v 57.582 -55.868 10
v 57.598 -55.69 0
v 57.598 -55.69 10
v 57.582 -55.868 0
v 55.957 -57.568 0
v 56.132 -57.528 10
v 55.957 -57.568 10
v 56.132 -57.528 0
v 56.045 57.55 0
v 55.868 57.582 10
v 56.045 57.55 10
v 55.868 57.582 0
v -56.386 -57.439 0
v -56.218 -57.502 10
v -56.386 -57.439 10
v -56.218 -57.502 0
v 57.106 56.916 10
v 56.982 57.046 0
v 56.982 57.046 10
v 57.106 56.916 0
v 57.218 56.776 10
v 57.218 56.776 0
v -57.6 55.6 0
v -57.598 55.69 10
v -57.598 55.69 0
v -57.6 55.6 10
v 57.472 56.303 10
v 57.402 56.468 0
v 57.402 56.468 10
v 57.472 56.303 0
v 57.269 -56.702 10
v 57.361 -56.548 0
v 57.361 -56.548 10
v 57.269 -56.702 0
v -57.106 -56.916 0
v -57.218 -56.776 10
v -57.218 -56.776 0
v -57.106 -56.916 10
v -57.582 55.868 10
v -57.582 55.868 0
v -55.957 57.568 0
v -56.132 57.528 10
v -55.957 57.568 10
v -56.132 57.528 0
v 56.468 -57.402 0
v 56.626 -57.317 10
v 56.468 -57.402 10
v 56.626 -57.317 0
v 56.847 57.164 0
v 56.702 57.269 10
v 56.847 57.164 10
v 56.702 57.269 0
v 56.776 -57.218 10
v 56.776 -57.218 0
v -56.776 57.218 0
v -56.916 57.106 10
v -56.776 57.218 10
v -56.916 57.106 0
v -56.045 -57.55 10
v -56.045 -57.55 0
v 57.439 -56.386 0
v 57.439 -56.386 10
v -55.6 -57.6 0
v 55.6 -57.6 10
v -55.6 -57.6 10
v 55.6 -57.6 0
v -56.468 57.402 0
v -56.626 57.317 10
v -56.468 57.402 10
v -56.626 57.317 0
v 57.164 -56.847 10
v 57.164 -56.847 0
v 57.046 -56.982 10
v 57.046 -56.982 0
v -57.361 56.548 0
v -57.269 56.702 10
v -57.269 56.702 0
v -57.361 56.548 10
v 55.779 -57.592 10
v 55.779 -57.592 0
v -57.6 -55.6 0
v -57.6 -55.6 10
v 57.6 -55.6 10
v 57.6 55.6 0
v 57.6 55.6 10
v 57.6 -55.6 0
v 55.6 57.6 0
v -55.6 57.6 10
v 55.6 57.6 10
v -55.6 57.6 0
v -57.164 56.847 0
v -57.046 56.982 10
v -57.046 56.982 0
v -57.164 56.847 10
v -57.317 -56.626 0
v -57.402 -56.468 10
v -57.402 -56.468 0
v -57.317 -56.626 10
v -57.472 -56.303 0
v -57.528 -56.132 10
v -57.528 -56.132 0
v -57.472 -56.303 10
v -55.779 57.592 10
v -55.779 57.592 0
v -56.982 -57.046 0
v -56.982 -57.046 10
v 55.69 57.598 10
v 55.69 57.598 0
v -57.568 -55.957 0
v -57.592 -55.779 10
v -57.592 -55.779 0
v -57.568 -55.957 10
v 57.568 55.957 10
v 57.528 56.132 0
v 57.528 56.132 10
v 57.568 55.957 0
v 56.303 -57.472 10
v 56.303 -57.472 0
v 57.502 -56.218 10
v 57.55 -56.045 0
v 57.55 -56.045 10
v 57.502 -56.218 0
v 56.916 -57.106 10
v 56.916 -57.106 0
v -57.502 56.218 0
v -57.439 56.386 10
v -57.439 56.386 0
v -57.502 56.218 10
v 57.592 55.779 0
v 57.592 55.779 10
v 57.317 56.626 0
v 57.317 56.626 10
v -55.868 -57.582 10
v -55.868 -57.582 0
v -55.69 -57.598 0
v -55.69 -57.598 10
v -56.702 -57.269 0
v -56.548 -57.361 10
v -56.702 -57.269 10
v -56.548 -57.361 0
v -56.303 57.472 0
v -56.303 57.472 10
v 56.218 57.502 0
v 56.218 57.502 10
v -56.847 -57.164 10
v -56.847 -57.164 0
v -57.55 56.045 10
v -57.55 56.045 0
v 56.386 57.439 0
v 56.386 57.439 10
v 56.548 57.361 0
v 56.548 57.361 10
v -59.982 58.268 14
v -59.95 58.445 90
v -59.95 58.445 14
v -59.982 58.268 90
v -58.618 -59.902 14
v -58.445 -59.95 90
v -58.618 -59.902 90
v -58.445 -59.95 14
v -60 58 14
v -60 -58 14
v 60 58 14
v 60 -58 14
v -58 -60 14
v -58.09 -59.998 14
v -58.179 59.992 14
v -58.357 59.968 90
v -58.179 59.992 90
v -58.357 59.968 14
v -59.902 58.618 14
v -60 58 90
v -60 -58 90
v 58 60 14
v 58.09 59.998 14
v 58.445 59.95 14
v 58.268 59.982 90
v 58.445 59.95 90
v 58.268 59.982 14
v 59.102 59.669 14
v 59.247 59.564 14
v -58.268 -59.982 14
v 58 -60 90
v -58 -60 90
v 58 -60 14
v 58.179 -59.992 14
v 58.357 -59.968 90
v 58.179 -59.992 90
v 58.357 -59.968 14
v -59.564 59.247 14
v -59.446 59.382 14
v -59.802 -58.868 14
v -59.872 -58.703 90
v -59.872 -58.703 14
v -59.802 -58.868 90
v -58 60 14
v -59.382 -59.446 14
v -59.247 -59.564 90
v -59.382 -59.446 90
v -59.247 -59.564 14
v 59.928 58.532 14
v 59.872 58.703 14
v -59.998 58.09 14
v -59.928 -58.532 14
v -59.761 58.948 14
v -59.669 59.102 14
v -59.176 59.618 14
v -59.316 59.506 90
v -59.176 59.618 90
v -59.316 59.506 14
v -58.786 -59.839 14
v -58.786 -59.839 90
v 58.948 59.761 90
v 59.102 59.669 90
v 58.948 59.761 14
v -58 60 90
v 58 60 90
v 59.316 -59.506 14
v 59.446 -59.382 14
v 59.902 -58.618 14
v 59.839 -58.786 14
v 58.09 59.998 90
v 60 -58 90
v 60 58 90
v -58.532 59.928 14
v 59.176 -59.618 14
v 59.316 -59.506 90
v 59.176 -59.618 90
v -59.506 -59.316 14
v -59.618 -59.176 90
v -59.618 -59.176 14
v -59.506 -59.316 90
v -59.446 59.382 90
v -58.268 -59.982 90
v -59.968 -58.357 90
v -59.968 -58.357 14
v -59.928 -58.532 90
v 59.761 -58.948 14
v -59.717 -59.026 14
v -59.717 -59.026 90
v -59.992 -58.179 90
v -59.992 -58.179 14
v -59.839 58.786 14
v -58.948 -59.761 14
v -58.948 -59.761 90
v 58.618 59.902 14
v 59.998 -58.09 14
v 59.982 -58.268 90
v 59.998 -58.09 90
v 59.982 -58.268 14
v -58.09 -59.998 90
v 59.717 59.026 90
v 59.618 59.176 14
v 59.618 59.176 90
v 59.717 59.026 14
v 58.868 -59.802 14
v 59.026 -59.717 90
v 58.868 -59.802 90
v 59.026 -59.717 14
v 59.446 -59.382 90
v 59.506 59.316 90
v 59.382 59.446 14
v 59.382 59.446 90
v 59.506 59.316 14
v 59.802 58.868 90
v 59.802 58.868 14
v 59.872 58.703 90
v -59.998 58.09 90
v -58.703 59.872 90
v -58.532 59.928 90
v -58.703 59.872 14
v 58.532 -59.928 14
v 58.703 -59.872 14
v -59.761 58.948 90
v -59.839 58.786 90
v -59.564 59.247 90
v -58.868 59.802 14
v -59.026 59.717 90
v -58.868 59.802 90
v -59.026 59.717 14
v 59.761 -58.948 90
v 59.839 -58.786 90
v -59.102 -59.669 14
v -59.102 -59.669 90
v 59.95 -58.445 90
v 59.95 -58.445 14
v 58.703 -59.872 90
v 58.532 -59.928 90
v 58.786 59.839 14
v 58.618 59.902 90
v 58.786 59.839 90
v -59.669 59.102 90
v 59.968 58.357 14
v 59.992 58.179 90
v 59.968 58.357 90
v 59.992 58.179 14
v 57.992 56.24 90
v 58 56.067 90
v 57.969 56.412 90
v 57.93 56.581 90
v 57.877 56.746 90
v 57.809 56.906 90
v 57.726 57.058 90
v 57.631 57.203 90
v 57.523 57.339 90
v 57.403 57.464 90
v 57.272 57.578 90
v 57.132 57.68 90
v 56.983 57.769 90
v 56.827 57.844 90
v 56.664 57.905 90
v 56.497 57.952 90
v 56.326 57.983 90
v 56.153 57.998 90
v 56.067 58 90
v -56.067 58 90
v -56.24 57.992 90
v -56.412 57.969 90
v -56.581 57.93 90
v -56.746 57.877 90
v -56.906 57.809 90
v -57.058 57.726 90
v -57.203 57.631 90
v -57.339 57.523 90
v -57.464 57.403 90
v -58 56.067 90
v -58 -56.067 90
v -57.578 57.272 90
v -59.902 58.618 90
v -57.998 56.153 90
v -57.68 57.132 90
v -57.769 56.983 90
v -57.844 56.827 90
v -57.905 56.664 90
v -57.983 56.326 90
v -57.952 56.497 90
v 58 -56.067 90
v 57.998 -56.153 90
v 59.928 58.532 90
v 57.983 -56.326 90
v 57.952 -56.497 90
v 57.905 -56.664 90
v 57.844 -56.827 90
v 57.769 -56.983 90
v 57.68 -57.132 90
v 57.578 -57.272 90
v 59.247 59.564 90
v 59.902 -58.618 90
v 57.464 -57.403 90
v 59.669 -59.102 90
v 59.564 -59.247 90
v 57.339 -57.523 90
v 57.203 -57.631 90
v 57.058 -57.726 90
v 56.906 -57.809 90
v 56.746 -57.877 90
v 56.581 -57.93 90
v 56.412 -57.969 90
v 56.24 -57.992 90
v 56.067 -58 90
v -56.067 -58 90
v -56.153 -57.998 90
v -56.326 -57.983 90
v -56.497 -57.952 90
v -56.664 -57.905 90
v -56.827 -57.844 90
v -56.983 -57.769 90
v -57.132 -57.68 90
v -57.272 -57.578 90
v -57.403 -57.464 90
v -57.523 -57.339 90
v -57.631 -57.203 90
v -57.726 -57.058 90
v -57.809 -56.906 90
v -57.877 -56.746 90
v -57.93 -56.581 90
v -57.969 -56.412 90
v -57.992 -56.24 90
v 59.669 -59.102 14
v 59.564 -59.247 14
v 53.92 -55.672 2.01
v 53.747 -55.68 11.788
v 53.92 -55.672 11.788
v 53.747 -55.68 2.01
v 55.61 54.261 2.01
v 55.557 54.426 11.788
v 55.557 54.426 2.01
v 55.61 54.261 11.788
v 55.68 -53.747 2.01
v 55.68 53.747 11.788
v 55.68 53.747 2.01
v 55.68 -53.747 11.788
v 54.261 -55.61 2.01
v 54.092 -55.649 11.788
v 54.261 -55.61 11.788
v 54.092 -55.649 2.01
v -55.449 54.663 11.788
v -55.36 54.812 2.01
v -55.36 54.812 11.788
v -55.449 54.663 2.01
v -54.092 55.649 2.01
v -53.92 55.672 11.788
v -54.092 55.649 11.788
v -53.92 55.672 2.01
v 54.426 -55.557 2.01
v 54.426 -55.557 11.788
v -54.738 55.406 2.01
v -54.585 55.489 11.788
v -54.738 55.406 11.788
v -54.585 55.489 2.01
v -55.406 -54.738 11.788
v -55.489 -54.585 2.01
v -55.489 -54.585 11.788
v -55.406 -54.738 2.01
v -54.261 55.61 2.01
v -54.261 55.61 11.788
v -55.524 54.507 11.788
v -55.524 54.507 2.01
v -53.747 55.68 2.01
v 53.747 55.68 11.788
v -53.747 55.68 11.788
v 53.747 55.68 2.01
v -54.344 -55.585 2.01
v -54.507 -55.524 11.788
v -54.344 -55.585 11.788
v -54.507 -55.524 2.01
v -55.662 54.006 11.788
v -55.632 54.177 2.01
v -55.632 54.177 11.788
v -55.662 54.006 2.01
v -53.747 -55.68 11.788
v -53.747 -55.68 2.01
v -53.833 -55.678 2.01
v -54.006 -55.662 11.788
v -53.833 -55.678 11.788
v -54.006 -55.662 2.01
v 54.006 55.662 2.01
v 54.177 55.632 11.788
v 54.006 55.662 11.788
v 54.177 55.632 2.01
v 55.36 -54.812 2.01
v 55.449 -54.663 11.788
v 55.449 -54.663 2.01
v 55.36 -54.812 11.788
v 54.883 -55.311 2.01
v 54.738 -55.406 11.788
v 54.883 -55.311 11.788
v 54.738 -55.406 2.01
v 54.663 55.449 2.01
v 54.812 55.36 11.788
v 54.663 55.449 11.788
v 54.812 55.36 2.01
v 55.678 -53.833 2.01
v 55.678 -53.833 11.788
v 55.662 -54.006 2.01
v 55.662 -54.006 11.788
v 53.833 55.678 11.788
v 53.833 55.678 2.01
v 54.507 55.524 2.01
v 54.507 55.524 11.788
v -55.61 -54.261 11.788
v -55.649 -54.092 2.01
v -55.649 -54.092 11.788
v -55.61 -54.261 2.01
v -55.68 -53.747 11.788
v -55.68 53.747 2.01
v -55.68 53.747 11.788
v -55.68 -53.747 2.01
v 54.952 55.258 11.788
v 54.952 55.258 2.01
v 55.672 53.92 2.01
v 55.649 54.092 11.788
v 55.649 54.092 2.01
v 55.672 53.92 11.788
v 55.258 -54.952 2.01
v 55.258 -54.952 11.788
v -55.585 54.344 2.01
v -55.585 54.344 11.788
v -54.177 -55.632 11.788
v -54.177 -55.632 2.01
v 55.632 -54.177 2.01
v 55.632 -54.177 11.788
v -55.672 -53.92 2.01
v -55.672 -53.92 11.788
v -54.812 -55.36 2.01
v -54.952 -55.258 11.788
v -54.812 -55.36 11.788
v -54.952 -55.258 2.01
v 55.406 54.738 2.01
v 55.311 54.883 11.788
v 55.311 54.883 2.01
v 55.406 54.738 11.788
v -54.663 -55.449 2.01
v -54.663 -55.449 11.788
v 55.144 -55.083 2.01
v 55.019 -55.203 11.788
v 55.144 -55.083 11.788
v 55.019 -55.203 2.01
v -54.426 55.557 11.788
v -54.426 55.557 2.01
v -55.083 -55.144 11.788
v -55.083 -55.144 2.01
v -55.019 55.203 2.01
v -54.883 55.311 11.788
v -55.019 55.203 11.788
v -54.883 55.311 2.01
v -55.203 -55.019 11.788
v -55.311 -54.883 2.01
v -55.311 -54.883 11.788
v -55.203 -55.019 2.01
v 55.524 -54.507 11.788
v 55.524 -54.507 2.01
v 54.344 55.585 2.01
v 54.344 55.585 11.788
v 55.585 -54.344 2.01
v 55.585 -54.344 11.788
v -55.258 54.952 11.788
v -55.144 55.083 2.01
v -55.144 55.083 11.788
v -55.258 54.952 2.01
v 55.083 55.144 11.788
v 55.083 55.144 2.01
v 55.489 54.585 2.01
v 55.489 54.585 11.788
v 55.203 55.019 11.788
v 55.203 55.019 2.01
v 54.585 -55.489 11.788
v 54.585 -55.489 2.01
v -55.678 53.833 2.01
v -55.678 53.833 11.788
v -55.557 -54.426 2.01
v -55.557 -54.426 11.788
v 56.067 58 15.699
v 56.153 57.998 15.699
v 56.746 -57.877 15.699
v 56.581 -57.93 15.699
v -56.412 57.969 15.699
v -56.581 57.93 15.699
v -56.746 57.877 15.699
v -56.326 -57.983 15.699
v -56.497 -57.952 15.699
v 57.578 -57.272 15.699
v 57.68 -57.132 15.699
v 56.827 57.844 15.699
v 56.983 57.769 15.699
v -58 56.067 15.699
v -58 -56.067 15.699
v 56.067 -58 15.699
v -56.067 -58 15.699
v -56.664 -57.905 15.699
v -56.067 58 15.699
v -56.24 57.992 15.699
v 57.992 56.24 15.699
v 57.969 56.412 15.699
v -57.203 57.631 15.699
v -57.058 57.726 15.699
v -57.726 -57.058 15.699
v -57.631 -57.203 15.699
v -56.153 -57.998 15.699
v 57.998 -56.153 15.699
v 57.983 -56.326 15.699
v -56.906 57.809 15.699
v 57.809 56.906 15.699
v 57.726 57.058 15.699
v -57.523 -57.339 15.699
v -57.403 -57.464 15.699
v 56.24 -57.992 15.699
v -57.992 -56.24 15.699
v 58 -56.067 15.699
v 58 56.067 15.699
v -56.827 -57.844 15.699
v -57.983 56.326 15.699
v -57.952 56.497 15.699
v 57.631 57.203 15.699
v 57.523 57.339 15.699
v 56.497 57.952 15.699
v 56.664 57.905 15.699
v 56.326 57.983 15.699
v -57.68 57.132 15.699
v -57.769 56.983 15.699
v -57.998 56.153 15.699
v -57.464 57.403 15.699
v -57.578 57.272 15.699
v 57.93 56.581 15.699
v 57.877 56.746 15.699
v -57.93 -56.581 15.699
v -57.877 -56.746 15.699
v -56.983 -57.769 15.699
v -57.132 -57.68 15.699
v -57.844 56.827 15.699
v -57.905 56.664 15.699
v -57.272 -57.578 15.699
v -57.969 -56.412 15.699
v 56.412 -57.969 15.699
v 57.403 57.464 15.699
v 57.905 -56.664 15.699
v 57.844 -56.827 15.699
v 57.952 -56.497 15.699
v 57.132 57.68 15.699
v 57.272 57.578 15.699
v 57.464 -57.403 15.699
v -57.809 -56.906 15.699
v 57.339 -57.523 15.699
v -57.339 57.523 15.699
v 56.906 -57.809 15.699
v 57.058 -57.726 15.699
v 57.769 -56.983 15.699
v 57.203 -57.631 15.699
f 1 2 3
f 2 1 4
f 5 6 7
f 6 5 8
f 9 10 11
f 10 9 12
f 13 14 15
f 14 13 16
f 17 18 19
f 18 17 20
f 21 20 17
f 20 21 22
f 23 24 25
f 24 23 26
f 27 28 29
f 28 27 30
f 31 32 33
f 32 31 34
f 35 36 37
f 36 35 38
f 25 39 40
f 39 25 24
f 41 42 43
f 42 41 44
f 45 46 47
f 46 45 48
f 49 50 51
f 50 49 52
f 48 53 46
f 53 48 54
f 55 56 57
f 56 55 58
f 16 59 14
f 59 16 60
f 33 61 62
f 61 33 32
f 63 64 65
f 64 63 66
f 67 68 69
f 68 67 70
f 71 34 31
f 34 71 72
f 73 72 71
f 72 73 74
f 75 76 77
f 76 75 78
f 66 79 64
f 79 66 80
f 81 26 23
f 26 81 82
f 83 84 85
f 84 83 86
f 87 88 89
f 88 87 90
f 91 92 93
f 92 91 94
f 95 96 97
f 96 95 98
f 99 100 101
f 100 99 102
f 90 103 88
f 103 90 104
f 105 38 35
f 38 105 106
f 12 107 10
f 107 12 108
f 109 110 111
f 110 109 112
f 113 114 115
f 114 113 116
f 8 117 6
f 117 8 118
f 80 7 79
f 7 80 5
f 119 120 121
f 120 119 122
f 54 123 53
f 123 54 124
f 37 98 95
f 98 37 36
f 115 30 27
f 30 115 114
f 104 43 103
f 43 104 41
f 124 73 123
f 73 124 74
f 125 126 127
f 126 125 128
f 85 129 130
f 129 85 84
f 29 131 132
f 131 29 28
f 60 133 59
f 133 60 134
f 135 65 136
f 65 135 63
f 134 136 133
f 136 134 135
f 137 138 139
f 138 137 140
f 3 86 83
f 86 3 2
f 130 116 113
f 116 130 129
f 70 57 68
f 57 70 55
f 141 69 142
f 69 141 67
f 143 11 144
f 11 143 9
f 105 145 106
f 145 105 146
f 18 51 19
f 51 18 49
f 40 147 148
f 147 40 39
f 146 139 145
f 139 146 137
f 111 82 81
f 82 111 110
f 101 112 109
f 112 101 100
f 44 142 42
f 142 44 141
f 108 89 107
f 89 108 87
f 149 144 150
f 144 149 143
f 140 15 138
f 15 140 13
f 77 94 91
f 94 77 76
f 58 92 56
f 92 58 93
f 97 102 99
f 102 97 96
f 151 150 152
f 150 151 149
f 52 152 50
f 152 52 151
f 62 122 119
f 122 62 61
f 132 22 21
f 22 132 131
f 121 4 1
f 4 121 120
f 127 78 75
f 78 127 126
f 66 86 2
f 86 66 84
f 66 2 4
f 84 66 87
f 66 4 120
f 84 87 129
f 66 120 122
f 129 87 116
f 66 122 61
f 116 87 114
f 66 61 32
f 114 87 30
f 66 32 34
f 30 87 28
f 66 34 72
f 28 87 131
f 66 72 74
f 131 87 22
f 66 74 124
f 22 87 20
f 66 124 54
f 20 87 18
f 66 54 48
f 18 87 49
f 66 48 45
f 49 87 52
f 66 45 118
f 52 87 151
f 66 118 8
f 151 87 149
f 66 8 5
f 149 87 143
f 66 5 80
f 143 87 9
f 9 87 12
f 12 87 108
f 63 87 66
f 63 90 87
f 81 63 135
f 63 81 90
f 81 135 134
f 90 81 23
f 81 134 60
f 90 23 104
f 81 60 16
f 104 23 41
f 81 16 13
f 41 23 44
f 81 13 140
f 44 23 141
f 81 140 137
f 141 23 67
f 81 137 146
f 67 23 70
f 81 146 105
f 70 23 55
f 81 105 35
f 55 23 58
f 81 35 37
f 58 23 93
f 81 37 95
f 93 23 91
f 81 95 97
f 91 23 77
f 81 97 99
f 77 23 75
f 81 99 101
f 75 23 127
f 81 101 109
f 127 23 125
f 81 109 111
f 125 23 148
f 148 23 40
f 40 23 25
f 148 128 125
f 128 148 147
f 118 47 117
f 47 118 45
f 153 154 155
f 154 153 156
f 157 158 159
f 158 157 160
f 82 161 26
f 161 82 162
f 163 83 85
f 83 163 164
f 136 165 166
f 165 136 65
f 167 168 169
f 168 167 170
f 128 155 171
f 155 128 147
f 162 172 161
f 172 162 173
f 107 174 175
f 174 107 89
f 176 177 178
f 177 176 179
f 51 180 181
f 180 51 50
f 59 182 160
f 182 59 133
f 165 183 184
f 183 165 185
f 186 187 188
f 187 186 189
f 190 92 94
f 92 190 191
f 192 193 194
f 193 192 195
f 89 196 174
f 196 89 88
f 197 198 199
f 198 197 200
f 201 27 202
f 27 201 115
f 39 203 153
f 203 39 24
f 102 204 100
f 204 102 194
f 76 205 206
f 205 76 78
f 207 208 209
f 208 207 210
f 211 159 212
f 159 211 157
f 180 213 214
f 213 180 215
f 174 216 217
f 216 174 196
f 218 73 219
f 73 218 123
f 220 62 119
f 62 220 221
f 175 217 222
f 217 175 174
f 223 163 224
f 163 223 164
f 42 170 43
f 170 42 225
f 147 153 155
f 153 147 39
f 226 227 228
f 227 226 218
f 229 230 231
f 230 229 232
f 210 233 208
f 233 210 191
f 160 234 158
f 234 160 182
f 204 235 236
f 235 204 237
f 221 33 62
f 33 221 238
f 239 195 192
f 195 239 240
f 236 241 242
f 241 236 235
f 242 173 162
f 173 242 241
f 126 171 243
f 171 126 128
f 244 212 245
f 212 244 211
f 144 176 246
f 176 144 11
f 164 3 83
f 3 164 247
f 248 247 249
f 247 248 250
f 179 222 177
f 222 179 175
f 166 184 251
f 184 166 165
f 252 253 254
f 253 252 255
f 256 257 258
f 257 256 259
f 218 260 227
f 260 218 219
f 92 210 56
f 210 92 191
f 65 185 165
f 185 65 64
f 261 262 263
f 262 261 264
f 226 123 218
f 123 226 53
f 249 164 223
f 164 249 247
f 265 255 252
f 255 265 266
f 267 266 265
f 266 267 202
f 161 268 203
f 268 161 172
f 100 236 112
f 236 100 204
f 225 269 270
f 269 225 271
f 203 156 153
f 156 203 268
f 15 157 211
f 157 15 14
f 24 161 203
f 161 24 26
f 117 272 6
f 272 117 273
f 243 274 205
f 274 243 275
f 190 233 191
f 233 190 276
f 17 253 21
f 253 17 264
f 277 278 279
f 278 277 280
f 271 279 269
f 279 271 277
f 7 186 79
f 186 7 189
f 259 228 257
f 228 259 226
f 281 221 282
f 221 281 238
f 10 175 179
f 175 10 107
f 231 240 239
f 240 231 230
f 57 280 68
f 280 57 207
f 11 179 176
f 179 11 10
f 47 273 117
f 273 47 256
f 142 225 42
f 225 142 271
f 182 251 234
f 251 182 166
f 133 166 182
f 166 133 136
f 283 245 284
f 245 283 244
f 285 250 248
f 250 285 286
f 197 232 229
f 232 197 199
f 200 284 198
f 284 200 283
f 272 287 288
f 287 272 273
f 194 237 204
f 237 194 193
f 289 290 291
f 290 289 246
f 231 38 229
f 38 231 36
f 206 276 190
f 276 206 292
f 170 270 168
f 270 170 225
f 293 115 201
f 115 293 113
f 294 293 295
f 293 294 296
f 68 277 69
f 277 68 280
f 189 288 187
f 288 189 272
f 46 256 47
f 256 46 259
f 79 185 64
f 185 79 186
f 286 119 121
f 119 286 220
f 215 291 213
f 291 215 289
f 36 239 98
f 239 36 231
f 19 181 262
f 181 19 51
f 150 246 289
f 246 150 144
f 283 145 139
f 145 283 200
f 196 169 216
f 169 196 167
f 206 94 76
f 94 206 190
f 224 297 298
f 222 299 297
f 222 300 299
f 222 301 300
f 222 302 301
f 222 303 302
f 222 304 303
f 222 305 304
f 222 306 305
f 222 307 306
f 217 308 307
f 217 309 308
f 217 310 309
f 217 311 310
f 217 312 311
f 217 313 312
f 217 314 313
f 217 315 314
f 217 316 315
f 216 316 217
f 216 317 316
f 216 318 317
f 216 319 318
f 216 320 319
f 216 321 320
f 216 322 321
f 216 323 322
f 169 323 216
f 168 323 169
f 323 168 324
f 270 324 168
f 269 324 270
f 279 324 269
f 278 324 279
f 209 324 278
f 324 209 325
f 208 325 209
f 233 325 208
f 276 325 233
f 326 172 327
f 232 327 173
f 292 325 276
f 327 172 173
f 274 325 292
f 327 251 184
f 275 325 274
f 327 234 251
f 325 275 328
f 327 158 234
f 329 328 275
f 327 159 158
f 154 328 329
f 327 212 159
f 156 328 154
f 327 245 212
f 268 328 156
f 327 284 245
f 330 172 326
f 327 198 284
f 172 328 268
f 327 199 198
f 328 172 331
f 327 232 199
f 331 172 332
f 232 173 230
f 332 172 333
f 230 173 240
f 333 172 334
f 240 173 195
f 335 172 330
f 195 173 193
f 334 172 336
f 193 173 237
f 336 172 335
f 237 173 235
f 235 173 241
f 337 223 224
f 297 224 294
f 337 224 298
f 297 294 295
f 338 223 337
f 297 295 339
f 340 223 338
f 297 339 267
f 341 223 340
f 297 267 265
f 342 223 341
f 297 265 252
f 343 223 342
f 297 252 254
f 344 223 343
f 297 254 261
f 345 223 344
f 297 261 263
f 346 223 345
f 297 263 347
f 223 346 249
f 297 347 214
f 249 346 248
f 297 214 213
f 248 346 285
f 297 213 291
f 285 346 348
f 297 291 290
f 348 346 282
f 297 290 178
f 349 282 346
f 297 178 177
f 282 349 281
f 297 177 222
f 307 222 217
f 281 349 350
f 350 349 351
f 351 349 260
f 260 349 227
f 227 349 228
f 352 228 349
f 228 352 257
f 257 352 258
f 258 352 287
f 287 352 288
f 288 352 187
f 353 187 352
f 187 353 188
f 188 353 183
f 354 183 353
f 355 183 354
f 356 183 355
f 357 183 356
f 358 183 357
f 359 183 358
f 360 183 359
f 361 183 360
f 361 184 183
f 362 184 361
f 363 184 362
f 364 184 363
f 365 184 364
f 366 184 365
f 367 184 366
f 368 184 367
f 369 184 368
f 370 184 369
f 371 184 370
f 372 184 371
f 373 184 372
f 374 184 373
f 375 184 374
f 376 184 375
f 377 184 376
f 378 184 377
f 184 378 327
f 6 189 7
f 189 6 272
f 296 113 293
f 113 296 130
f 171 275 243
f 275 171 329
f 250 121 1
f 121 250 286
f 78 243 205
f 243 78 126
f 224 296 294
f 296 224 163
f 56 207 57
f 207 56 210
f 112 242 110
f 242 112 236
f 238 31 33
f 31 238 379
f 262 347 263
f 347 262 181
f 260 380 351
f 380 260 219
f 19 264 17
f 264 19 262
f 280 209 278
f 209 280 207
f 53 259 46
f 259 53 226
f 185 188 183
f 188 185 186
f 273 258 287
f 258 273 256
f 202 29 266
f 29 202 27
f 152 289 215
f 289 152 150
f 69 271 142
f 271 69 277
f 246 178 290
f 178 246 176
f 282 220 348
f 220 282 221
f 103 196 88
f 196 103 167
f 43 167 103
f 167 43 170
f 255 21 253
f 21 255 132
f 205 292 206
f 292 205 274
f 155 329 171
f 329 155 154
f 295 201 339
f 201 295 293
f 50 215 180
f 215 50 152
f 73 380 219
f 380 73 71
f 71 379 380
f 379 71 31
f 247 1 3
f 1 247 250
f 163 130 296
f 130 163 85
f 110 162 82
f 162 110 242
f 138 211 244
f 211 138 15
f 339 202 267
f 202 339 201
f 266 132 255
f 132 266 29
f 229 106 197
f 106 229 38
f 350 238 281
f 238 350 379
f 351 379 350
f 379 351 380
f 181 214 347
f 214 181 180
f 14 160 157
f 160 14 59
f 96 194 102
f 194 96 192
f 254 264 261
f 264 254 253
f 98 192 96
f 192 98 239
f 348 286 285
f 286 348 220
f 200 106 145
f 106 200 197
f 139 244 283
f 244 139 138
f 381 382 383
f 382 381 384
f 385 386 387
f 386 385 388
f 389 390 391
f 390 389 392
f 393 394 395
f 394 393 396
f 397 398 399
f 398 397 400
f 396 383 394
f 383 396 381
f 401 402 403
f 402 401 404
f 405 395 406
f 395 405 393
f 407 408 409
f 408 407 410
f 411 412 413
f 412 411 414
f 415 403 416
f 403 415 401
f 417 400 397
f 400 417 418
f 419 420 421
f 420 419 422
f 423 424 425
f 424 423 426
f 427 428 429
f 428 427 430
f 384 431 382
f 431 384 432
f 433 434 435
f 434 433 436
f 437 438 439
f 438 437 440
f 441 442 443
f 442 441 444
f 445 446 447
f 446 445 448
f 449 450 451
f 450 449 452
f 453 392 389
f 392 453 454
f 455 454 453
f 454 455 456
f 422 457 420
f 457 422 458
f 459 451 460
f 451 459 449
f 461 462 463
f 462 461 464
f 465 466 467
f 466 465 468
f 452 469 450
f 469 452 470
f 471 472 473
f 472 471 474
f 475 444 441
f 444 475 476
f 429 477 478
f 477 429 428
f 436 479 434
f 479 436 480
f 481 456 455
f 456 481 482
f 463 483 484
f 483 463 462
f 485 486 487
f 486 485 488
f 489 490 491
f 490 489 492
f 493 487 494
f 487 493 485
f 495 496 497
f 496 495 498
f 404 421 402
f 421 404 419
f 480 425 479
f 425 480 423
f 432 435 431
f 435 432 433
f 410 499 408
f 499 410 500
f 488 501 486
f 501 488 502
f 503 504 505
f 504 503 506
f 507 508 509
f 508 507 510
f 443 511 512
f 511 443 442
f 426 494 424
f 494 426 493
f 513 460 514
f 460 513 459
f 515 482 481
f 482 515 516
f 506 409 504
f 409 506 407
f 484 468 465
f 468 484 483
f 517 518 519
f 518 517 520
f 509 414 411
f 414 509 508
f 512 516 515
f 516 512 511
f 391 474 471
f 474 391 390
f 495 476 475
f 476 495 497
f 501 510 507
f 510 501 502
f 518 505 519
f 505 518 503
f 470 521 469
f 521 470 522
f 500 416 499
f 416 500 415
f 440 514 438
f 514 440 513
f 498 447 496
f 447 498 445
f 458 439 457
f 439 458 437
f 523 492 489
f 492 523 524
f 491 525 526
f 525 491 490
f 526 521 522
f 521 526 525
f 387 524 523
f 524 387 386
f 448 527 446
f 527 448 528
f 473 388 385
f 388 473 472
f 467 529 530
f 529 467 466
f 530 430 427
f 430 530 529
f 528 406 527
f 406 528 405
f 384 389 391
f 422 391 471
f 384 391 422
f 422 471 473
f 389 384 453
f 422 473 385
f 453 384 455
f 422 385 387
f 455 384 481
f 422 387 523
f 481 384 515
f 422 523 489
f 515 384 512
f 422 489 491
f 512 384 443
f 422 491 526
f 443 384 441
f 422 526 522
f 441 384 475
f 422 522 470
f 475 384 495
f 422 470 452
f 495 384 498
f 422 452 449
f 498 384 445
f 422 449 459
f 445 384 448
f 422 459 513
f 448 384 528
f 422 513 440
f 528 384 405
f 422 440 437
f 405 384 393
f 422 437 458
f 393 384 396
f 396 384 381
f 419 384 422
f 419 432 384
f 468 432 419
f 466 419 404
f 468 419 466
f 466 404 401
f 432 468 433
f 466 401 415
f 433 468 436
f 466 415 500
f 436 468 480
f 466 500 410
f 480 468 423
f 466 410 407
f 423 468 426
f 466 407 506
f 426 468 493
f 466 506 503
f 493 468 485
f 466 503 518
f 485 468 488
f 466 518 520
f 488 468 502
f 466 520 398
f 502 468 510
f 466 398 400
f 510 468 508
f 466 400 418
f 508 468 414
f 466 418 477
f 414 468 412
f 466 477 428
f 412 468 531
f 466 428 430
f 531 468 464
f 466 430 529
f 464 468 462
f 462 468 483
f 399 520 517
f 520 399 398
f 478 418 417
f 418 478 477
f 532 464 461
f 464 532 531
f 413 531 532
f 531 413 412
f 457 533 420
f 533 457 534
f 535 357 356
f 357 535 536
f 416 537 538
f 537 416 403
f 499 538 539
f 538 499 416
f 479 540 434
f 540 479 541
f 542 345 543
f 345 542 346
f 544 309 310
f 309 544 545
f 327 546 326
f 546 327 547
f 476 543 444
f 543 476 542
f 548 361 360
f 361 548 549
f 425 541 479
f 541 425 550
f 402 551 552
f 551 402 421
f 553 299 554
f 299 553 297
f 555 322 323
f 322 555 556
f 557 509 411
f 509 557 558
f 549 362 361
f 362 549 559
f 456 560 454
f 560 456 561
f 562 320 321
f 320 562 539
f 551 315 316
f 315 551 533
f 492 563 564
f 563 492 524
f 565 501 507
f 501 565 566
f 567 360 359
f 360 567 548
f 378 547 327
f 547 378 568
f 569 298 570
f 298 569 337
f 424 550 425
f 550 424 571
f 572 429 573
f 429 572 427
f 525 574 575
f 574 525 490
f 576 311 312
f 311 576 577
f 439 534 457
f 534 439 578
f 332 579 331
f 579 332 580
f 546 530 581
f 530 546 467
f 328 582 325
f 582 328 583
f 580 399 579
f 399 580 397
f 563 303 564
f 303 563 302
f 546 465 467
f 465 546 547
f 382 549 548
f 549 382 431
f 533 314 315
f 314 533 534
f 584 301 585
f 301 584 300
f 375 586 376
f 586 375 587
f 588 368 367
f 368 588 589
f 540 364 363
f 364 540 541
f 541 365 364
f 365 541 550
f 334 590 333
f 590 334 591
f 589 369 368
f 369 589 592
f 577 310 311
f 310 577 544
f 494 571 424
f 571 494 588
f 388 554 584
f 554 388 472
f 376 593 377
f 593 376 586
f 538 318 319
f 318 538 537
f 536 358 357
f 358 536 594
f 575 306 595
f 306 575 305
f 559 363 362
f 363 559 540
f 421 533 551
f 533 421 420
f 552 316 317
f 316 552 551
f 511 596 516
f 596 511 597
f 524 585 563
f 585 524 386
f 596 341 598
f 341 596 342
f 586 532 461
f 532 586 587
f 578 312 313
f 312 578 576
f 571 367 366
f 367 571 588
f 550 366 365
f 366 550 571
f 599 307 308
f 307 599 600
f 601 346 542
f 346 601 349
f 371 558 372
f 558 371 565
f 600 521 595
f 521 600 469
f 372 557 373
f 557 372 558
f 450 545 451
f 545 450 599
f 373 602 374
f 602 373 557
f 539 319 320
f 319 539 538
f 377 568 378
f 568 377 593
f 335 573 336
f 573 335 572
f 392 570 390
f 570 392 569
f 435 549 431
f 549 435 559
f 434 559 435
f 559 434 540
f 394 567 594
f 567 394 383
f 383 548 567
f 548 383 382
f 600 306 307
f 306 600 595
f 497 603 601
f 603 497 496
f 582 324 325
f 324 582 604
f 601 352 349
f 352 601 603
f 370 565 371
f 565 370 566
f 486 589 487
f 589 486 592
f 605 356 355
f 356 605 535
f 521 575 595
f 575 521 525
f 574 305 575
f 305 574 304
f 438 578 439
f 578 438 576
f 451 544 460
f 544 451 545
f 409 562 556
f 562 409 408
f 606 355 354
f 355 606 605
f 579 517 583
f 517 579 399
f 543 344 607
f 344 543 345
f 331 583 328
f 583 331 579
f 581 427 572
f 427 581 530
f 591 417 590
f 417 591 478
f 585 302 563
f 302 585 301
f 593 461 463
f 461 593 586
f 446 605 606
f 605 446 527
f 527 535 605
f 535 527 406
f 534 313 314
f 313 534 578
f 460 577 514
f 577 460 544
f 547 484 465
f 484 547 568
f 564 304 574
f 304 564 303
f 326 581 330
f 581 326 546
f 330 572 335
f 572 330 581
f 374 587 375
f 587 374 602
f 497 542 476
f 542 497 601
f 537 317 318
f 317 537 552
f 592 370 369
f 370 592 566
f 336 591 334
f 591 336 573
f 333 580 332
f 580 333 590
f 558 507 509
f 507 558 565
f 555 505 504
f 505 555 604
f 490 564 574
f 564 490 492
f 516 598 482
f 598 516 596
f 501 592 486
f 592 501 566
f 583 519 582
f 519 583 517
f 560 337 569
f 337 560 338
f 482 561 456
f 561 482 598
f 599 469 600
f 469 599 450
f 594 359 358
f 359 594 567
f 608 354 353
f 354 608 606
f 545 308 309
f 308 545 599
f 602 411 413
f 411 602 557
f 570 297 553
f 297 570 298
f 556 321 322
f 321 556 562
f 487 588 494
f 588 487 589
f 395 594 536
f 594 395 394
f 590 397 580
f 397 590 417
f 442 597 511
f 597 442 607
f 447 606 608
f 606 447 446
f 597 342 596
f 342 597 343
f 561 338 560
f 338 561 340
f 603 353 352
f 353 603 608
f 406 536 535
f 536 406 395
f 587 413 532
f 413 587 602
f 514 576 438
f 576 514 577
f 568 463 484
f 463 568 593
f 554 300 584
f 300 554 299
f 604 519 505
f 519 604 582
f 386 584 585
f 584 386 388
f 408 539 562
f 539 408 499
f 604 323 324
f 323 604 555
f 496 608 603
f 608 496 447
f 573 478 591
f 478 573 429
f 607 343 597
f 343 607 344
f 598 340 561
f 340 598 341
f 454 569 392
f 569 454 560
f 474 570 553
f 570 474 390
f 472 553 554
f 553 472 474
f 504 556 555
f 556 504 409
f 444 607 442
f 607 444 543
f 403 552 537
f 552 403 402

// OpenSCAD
// Parameters {{{
thickness = 2;

width = 120;
depth = 120;
height = 90;

bottom_height = 14;
bottom_margin = 0.4;
connector_height = 4;

mode = "normal";
vase_thickness = 0.8;
// }}}

// Initialization {{{
$fn = 70;

assert(mode == "vase" || mode == "normal", str("Invalid mode: ", mode));
// }}}

module base(width, depth) // {{{
{
    r = 2;

    offset(r = r) offset(delta = -r)
    {
        square([ width, depth ], center = true);
    }
} // }}}

module box() // {{{
{

    linear_extrude(height = bottom_height - connector_height)
    {
        base(width - thickness * 2 - bottom_margin * 2, depth - thickness * 2 - bottom_margin * 2);
    }

    hull()
    {
        translate([ 0, 0, bottom_height - connector_height ])
        {
            linear_extrude(height = connector_height)
            {
                base(width - thickness * 2 - bottom_margin * 2, depth - thickness * 2 - bottom_margin * 2);
            }
        }

        translate([ 0, 0, bottom_height ])
        {
            linear_extrude(height = height - bottom_height)
            {
                base(width, depth);
            }
        }
    }
} // }}}

module main() // {{{
{
    if (mode == "vase")
    {
        box();
    }
    else
    {
        difference()
        {

            box();
            translate([ 0, 0, thickness + 0.01 ])
            {
                resize([ width - thickness * 2, depth - thickness * 2, height - thickness ])
                {
                    box();
                }
            }
        }
    }
} // }}}

main();
